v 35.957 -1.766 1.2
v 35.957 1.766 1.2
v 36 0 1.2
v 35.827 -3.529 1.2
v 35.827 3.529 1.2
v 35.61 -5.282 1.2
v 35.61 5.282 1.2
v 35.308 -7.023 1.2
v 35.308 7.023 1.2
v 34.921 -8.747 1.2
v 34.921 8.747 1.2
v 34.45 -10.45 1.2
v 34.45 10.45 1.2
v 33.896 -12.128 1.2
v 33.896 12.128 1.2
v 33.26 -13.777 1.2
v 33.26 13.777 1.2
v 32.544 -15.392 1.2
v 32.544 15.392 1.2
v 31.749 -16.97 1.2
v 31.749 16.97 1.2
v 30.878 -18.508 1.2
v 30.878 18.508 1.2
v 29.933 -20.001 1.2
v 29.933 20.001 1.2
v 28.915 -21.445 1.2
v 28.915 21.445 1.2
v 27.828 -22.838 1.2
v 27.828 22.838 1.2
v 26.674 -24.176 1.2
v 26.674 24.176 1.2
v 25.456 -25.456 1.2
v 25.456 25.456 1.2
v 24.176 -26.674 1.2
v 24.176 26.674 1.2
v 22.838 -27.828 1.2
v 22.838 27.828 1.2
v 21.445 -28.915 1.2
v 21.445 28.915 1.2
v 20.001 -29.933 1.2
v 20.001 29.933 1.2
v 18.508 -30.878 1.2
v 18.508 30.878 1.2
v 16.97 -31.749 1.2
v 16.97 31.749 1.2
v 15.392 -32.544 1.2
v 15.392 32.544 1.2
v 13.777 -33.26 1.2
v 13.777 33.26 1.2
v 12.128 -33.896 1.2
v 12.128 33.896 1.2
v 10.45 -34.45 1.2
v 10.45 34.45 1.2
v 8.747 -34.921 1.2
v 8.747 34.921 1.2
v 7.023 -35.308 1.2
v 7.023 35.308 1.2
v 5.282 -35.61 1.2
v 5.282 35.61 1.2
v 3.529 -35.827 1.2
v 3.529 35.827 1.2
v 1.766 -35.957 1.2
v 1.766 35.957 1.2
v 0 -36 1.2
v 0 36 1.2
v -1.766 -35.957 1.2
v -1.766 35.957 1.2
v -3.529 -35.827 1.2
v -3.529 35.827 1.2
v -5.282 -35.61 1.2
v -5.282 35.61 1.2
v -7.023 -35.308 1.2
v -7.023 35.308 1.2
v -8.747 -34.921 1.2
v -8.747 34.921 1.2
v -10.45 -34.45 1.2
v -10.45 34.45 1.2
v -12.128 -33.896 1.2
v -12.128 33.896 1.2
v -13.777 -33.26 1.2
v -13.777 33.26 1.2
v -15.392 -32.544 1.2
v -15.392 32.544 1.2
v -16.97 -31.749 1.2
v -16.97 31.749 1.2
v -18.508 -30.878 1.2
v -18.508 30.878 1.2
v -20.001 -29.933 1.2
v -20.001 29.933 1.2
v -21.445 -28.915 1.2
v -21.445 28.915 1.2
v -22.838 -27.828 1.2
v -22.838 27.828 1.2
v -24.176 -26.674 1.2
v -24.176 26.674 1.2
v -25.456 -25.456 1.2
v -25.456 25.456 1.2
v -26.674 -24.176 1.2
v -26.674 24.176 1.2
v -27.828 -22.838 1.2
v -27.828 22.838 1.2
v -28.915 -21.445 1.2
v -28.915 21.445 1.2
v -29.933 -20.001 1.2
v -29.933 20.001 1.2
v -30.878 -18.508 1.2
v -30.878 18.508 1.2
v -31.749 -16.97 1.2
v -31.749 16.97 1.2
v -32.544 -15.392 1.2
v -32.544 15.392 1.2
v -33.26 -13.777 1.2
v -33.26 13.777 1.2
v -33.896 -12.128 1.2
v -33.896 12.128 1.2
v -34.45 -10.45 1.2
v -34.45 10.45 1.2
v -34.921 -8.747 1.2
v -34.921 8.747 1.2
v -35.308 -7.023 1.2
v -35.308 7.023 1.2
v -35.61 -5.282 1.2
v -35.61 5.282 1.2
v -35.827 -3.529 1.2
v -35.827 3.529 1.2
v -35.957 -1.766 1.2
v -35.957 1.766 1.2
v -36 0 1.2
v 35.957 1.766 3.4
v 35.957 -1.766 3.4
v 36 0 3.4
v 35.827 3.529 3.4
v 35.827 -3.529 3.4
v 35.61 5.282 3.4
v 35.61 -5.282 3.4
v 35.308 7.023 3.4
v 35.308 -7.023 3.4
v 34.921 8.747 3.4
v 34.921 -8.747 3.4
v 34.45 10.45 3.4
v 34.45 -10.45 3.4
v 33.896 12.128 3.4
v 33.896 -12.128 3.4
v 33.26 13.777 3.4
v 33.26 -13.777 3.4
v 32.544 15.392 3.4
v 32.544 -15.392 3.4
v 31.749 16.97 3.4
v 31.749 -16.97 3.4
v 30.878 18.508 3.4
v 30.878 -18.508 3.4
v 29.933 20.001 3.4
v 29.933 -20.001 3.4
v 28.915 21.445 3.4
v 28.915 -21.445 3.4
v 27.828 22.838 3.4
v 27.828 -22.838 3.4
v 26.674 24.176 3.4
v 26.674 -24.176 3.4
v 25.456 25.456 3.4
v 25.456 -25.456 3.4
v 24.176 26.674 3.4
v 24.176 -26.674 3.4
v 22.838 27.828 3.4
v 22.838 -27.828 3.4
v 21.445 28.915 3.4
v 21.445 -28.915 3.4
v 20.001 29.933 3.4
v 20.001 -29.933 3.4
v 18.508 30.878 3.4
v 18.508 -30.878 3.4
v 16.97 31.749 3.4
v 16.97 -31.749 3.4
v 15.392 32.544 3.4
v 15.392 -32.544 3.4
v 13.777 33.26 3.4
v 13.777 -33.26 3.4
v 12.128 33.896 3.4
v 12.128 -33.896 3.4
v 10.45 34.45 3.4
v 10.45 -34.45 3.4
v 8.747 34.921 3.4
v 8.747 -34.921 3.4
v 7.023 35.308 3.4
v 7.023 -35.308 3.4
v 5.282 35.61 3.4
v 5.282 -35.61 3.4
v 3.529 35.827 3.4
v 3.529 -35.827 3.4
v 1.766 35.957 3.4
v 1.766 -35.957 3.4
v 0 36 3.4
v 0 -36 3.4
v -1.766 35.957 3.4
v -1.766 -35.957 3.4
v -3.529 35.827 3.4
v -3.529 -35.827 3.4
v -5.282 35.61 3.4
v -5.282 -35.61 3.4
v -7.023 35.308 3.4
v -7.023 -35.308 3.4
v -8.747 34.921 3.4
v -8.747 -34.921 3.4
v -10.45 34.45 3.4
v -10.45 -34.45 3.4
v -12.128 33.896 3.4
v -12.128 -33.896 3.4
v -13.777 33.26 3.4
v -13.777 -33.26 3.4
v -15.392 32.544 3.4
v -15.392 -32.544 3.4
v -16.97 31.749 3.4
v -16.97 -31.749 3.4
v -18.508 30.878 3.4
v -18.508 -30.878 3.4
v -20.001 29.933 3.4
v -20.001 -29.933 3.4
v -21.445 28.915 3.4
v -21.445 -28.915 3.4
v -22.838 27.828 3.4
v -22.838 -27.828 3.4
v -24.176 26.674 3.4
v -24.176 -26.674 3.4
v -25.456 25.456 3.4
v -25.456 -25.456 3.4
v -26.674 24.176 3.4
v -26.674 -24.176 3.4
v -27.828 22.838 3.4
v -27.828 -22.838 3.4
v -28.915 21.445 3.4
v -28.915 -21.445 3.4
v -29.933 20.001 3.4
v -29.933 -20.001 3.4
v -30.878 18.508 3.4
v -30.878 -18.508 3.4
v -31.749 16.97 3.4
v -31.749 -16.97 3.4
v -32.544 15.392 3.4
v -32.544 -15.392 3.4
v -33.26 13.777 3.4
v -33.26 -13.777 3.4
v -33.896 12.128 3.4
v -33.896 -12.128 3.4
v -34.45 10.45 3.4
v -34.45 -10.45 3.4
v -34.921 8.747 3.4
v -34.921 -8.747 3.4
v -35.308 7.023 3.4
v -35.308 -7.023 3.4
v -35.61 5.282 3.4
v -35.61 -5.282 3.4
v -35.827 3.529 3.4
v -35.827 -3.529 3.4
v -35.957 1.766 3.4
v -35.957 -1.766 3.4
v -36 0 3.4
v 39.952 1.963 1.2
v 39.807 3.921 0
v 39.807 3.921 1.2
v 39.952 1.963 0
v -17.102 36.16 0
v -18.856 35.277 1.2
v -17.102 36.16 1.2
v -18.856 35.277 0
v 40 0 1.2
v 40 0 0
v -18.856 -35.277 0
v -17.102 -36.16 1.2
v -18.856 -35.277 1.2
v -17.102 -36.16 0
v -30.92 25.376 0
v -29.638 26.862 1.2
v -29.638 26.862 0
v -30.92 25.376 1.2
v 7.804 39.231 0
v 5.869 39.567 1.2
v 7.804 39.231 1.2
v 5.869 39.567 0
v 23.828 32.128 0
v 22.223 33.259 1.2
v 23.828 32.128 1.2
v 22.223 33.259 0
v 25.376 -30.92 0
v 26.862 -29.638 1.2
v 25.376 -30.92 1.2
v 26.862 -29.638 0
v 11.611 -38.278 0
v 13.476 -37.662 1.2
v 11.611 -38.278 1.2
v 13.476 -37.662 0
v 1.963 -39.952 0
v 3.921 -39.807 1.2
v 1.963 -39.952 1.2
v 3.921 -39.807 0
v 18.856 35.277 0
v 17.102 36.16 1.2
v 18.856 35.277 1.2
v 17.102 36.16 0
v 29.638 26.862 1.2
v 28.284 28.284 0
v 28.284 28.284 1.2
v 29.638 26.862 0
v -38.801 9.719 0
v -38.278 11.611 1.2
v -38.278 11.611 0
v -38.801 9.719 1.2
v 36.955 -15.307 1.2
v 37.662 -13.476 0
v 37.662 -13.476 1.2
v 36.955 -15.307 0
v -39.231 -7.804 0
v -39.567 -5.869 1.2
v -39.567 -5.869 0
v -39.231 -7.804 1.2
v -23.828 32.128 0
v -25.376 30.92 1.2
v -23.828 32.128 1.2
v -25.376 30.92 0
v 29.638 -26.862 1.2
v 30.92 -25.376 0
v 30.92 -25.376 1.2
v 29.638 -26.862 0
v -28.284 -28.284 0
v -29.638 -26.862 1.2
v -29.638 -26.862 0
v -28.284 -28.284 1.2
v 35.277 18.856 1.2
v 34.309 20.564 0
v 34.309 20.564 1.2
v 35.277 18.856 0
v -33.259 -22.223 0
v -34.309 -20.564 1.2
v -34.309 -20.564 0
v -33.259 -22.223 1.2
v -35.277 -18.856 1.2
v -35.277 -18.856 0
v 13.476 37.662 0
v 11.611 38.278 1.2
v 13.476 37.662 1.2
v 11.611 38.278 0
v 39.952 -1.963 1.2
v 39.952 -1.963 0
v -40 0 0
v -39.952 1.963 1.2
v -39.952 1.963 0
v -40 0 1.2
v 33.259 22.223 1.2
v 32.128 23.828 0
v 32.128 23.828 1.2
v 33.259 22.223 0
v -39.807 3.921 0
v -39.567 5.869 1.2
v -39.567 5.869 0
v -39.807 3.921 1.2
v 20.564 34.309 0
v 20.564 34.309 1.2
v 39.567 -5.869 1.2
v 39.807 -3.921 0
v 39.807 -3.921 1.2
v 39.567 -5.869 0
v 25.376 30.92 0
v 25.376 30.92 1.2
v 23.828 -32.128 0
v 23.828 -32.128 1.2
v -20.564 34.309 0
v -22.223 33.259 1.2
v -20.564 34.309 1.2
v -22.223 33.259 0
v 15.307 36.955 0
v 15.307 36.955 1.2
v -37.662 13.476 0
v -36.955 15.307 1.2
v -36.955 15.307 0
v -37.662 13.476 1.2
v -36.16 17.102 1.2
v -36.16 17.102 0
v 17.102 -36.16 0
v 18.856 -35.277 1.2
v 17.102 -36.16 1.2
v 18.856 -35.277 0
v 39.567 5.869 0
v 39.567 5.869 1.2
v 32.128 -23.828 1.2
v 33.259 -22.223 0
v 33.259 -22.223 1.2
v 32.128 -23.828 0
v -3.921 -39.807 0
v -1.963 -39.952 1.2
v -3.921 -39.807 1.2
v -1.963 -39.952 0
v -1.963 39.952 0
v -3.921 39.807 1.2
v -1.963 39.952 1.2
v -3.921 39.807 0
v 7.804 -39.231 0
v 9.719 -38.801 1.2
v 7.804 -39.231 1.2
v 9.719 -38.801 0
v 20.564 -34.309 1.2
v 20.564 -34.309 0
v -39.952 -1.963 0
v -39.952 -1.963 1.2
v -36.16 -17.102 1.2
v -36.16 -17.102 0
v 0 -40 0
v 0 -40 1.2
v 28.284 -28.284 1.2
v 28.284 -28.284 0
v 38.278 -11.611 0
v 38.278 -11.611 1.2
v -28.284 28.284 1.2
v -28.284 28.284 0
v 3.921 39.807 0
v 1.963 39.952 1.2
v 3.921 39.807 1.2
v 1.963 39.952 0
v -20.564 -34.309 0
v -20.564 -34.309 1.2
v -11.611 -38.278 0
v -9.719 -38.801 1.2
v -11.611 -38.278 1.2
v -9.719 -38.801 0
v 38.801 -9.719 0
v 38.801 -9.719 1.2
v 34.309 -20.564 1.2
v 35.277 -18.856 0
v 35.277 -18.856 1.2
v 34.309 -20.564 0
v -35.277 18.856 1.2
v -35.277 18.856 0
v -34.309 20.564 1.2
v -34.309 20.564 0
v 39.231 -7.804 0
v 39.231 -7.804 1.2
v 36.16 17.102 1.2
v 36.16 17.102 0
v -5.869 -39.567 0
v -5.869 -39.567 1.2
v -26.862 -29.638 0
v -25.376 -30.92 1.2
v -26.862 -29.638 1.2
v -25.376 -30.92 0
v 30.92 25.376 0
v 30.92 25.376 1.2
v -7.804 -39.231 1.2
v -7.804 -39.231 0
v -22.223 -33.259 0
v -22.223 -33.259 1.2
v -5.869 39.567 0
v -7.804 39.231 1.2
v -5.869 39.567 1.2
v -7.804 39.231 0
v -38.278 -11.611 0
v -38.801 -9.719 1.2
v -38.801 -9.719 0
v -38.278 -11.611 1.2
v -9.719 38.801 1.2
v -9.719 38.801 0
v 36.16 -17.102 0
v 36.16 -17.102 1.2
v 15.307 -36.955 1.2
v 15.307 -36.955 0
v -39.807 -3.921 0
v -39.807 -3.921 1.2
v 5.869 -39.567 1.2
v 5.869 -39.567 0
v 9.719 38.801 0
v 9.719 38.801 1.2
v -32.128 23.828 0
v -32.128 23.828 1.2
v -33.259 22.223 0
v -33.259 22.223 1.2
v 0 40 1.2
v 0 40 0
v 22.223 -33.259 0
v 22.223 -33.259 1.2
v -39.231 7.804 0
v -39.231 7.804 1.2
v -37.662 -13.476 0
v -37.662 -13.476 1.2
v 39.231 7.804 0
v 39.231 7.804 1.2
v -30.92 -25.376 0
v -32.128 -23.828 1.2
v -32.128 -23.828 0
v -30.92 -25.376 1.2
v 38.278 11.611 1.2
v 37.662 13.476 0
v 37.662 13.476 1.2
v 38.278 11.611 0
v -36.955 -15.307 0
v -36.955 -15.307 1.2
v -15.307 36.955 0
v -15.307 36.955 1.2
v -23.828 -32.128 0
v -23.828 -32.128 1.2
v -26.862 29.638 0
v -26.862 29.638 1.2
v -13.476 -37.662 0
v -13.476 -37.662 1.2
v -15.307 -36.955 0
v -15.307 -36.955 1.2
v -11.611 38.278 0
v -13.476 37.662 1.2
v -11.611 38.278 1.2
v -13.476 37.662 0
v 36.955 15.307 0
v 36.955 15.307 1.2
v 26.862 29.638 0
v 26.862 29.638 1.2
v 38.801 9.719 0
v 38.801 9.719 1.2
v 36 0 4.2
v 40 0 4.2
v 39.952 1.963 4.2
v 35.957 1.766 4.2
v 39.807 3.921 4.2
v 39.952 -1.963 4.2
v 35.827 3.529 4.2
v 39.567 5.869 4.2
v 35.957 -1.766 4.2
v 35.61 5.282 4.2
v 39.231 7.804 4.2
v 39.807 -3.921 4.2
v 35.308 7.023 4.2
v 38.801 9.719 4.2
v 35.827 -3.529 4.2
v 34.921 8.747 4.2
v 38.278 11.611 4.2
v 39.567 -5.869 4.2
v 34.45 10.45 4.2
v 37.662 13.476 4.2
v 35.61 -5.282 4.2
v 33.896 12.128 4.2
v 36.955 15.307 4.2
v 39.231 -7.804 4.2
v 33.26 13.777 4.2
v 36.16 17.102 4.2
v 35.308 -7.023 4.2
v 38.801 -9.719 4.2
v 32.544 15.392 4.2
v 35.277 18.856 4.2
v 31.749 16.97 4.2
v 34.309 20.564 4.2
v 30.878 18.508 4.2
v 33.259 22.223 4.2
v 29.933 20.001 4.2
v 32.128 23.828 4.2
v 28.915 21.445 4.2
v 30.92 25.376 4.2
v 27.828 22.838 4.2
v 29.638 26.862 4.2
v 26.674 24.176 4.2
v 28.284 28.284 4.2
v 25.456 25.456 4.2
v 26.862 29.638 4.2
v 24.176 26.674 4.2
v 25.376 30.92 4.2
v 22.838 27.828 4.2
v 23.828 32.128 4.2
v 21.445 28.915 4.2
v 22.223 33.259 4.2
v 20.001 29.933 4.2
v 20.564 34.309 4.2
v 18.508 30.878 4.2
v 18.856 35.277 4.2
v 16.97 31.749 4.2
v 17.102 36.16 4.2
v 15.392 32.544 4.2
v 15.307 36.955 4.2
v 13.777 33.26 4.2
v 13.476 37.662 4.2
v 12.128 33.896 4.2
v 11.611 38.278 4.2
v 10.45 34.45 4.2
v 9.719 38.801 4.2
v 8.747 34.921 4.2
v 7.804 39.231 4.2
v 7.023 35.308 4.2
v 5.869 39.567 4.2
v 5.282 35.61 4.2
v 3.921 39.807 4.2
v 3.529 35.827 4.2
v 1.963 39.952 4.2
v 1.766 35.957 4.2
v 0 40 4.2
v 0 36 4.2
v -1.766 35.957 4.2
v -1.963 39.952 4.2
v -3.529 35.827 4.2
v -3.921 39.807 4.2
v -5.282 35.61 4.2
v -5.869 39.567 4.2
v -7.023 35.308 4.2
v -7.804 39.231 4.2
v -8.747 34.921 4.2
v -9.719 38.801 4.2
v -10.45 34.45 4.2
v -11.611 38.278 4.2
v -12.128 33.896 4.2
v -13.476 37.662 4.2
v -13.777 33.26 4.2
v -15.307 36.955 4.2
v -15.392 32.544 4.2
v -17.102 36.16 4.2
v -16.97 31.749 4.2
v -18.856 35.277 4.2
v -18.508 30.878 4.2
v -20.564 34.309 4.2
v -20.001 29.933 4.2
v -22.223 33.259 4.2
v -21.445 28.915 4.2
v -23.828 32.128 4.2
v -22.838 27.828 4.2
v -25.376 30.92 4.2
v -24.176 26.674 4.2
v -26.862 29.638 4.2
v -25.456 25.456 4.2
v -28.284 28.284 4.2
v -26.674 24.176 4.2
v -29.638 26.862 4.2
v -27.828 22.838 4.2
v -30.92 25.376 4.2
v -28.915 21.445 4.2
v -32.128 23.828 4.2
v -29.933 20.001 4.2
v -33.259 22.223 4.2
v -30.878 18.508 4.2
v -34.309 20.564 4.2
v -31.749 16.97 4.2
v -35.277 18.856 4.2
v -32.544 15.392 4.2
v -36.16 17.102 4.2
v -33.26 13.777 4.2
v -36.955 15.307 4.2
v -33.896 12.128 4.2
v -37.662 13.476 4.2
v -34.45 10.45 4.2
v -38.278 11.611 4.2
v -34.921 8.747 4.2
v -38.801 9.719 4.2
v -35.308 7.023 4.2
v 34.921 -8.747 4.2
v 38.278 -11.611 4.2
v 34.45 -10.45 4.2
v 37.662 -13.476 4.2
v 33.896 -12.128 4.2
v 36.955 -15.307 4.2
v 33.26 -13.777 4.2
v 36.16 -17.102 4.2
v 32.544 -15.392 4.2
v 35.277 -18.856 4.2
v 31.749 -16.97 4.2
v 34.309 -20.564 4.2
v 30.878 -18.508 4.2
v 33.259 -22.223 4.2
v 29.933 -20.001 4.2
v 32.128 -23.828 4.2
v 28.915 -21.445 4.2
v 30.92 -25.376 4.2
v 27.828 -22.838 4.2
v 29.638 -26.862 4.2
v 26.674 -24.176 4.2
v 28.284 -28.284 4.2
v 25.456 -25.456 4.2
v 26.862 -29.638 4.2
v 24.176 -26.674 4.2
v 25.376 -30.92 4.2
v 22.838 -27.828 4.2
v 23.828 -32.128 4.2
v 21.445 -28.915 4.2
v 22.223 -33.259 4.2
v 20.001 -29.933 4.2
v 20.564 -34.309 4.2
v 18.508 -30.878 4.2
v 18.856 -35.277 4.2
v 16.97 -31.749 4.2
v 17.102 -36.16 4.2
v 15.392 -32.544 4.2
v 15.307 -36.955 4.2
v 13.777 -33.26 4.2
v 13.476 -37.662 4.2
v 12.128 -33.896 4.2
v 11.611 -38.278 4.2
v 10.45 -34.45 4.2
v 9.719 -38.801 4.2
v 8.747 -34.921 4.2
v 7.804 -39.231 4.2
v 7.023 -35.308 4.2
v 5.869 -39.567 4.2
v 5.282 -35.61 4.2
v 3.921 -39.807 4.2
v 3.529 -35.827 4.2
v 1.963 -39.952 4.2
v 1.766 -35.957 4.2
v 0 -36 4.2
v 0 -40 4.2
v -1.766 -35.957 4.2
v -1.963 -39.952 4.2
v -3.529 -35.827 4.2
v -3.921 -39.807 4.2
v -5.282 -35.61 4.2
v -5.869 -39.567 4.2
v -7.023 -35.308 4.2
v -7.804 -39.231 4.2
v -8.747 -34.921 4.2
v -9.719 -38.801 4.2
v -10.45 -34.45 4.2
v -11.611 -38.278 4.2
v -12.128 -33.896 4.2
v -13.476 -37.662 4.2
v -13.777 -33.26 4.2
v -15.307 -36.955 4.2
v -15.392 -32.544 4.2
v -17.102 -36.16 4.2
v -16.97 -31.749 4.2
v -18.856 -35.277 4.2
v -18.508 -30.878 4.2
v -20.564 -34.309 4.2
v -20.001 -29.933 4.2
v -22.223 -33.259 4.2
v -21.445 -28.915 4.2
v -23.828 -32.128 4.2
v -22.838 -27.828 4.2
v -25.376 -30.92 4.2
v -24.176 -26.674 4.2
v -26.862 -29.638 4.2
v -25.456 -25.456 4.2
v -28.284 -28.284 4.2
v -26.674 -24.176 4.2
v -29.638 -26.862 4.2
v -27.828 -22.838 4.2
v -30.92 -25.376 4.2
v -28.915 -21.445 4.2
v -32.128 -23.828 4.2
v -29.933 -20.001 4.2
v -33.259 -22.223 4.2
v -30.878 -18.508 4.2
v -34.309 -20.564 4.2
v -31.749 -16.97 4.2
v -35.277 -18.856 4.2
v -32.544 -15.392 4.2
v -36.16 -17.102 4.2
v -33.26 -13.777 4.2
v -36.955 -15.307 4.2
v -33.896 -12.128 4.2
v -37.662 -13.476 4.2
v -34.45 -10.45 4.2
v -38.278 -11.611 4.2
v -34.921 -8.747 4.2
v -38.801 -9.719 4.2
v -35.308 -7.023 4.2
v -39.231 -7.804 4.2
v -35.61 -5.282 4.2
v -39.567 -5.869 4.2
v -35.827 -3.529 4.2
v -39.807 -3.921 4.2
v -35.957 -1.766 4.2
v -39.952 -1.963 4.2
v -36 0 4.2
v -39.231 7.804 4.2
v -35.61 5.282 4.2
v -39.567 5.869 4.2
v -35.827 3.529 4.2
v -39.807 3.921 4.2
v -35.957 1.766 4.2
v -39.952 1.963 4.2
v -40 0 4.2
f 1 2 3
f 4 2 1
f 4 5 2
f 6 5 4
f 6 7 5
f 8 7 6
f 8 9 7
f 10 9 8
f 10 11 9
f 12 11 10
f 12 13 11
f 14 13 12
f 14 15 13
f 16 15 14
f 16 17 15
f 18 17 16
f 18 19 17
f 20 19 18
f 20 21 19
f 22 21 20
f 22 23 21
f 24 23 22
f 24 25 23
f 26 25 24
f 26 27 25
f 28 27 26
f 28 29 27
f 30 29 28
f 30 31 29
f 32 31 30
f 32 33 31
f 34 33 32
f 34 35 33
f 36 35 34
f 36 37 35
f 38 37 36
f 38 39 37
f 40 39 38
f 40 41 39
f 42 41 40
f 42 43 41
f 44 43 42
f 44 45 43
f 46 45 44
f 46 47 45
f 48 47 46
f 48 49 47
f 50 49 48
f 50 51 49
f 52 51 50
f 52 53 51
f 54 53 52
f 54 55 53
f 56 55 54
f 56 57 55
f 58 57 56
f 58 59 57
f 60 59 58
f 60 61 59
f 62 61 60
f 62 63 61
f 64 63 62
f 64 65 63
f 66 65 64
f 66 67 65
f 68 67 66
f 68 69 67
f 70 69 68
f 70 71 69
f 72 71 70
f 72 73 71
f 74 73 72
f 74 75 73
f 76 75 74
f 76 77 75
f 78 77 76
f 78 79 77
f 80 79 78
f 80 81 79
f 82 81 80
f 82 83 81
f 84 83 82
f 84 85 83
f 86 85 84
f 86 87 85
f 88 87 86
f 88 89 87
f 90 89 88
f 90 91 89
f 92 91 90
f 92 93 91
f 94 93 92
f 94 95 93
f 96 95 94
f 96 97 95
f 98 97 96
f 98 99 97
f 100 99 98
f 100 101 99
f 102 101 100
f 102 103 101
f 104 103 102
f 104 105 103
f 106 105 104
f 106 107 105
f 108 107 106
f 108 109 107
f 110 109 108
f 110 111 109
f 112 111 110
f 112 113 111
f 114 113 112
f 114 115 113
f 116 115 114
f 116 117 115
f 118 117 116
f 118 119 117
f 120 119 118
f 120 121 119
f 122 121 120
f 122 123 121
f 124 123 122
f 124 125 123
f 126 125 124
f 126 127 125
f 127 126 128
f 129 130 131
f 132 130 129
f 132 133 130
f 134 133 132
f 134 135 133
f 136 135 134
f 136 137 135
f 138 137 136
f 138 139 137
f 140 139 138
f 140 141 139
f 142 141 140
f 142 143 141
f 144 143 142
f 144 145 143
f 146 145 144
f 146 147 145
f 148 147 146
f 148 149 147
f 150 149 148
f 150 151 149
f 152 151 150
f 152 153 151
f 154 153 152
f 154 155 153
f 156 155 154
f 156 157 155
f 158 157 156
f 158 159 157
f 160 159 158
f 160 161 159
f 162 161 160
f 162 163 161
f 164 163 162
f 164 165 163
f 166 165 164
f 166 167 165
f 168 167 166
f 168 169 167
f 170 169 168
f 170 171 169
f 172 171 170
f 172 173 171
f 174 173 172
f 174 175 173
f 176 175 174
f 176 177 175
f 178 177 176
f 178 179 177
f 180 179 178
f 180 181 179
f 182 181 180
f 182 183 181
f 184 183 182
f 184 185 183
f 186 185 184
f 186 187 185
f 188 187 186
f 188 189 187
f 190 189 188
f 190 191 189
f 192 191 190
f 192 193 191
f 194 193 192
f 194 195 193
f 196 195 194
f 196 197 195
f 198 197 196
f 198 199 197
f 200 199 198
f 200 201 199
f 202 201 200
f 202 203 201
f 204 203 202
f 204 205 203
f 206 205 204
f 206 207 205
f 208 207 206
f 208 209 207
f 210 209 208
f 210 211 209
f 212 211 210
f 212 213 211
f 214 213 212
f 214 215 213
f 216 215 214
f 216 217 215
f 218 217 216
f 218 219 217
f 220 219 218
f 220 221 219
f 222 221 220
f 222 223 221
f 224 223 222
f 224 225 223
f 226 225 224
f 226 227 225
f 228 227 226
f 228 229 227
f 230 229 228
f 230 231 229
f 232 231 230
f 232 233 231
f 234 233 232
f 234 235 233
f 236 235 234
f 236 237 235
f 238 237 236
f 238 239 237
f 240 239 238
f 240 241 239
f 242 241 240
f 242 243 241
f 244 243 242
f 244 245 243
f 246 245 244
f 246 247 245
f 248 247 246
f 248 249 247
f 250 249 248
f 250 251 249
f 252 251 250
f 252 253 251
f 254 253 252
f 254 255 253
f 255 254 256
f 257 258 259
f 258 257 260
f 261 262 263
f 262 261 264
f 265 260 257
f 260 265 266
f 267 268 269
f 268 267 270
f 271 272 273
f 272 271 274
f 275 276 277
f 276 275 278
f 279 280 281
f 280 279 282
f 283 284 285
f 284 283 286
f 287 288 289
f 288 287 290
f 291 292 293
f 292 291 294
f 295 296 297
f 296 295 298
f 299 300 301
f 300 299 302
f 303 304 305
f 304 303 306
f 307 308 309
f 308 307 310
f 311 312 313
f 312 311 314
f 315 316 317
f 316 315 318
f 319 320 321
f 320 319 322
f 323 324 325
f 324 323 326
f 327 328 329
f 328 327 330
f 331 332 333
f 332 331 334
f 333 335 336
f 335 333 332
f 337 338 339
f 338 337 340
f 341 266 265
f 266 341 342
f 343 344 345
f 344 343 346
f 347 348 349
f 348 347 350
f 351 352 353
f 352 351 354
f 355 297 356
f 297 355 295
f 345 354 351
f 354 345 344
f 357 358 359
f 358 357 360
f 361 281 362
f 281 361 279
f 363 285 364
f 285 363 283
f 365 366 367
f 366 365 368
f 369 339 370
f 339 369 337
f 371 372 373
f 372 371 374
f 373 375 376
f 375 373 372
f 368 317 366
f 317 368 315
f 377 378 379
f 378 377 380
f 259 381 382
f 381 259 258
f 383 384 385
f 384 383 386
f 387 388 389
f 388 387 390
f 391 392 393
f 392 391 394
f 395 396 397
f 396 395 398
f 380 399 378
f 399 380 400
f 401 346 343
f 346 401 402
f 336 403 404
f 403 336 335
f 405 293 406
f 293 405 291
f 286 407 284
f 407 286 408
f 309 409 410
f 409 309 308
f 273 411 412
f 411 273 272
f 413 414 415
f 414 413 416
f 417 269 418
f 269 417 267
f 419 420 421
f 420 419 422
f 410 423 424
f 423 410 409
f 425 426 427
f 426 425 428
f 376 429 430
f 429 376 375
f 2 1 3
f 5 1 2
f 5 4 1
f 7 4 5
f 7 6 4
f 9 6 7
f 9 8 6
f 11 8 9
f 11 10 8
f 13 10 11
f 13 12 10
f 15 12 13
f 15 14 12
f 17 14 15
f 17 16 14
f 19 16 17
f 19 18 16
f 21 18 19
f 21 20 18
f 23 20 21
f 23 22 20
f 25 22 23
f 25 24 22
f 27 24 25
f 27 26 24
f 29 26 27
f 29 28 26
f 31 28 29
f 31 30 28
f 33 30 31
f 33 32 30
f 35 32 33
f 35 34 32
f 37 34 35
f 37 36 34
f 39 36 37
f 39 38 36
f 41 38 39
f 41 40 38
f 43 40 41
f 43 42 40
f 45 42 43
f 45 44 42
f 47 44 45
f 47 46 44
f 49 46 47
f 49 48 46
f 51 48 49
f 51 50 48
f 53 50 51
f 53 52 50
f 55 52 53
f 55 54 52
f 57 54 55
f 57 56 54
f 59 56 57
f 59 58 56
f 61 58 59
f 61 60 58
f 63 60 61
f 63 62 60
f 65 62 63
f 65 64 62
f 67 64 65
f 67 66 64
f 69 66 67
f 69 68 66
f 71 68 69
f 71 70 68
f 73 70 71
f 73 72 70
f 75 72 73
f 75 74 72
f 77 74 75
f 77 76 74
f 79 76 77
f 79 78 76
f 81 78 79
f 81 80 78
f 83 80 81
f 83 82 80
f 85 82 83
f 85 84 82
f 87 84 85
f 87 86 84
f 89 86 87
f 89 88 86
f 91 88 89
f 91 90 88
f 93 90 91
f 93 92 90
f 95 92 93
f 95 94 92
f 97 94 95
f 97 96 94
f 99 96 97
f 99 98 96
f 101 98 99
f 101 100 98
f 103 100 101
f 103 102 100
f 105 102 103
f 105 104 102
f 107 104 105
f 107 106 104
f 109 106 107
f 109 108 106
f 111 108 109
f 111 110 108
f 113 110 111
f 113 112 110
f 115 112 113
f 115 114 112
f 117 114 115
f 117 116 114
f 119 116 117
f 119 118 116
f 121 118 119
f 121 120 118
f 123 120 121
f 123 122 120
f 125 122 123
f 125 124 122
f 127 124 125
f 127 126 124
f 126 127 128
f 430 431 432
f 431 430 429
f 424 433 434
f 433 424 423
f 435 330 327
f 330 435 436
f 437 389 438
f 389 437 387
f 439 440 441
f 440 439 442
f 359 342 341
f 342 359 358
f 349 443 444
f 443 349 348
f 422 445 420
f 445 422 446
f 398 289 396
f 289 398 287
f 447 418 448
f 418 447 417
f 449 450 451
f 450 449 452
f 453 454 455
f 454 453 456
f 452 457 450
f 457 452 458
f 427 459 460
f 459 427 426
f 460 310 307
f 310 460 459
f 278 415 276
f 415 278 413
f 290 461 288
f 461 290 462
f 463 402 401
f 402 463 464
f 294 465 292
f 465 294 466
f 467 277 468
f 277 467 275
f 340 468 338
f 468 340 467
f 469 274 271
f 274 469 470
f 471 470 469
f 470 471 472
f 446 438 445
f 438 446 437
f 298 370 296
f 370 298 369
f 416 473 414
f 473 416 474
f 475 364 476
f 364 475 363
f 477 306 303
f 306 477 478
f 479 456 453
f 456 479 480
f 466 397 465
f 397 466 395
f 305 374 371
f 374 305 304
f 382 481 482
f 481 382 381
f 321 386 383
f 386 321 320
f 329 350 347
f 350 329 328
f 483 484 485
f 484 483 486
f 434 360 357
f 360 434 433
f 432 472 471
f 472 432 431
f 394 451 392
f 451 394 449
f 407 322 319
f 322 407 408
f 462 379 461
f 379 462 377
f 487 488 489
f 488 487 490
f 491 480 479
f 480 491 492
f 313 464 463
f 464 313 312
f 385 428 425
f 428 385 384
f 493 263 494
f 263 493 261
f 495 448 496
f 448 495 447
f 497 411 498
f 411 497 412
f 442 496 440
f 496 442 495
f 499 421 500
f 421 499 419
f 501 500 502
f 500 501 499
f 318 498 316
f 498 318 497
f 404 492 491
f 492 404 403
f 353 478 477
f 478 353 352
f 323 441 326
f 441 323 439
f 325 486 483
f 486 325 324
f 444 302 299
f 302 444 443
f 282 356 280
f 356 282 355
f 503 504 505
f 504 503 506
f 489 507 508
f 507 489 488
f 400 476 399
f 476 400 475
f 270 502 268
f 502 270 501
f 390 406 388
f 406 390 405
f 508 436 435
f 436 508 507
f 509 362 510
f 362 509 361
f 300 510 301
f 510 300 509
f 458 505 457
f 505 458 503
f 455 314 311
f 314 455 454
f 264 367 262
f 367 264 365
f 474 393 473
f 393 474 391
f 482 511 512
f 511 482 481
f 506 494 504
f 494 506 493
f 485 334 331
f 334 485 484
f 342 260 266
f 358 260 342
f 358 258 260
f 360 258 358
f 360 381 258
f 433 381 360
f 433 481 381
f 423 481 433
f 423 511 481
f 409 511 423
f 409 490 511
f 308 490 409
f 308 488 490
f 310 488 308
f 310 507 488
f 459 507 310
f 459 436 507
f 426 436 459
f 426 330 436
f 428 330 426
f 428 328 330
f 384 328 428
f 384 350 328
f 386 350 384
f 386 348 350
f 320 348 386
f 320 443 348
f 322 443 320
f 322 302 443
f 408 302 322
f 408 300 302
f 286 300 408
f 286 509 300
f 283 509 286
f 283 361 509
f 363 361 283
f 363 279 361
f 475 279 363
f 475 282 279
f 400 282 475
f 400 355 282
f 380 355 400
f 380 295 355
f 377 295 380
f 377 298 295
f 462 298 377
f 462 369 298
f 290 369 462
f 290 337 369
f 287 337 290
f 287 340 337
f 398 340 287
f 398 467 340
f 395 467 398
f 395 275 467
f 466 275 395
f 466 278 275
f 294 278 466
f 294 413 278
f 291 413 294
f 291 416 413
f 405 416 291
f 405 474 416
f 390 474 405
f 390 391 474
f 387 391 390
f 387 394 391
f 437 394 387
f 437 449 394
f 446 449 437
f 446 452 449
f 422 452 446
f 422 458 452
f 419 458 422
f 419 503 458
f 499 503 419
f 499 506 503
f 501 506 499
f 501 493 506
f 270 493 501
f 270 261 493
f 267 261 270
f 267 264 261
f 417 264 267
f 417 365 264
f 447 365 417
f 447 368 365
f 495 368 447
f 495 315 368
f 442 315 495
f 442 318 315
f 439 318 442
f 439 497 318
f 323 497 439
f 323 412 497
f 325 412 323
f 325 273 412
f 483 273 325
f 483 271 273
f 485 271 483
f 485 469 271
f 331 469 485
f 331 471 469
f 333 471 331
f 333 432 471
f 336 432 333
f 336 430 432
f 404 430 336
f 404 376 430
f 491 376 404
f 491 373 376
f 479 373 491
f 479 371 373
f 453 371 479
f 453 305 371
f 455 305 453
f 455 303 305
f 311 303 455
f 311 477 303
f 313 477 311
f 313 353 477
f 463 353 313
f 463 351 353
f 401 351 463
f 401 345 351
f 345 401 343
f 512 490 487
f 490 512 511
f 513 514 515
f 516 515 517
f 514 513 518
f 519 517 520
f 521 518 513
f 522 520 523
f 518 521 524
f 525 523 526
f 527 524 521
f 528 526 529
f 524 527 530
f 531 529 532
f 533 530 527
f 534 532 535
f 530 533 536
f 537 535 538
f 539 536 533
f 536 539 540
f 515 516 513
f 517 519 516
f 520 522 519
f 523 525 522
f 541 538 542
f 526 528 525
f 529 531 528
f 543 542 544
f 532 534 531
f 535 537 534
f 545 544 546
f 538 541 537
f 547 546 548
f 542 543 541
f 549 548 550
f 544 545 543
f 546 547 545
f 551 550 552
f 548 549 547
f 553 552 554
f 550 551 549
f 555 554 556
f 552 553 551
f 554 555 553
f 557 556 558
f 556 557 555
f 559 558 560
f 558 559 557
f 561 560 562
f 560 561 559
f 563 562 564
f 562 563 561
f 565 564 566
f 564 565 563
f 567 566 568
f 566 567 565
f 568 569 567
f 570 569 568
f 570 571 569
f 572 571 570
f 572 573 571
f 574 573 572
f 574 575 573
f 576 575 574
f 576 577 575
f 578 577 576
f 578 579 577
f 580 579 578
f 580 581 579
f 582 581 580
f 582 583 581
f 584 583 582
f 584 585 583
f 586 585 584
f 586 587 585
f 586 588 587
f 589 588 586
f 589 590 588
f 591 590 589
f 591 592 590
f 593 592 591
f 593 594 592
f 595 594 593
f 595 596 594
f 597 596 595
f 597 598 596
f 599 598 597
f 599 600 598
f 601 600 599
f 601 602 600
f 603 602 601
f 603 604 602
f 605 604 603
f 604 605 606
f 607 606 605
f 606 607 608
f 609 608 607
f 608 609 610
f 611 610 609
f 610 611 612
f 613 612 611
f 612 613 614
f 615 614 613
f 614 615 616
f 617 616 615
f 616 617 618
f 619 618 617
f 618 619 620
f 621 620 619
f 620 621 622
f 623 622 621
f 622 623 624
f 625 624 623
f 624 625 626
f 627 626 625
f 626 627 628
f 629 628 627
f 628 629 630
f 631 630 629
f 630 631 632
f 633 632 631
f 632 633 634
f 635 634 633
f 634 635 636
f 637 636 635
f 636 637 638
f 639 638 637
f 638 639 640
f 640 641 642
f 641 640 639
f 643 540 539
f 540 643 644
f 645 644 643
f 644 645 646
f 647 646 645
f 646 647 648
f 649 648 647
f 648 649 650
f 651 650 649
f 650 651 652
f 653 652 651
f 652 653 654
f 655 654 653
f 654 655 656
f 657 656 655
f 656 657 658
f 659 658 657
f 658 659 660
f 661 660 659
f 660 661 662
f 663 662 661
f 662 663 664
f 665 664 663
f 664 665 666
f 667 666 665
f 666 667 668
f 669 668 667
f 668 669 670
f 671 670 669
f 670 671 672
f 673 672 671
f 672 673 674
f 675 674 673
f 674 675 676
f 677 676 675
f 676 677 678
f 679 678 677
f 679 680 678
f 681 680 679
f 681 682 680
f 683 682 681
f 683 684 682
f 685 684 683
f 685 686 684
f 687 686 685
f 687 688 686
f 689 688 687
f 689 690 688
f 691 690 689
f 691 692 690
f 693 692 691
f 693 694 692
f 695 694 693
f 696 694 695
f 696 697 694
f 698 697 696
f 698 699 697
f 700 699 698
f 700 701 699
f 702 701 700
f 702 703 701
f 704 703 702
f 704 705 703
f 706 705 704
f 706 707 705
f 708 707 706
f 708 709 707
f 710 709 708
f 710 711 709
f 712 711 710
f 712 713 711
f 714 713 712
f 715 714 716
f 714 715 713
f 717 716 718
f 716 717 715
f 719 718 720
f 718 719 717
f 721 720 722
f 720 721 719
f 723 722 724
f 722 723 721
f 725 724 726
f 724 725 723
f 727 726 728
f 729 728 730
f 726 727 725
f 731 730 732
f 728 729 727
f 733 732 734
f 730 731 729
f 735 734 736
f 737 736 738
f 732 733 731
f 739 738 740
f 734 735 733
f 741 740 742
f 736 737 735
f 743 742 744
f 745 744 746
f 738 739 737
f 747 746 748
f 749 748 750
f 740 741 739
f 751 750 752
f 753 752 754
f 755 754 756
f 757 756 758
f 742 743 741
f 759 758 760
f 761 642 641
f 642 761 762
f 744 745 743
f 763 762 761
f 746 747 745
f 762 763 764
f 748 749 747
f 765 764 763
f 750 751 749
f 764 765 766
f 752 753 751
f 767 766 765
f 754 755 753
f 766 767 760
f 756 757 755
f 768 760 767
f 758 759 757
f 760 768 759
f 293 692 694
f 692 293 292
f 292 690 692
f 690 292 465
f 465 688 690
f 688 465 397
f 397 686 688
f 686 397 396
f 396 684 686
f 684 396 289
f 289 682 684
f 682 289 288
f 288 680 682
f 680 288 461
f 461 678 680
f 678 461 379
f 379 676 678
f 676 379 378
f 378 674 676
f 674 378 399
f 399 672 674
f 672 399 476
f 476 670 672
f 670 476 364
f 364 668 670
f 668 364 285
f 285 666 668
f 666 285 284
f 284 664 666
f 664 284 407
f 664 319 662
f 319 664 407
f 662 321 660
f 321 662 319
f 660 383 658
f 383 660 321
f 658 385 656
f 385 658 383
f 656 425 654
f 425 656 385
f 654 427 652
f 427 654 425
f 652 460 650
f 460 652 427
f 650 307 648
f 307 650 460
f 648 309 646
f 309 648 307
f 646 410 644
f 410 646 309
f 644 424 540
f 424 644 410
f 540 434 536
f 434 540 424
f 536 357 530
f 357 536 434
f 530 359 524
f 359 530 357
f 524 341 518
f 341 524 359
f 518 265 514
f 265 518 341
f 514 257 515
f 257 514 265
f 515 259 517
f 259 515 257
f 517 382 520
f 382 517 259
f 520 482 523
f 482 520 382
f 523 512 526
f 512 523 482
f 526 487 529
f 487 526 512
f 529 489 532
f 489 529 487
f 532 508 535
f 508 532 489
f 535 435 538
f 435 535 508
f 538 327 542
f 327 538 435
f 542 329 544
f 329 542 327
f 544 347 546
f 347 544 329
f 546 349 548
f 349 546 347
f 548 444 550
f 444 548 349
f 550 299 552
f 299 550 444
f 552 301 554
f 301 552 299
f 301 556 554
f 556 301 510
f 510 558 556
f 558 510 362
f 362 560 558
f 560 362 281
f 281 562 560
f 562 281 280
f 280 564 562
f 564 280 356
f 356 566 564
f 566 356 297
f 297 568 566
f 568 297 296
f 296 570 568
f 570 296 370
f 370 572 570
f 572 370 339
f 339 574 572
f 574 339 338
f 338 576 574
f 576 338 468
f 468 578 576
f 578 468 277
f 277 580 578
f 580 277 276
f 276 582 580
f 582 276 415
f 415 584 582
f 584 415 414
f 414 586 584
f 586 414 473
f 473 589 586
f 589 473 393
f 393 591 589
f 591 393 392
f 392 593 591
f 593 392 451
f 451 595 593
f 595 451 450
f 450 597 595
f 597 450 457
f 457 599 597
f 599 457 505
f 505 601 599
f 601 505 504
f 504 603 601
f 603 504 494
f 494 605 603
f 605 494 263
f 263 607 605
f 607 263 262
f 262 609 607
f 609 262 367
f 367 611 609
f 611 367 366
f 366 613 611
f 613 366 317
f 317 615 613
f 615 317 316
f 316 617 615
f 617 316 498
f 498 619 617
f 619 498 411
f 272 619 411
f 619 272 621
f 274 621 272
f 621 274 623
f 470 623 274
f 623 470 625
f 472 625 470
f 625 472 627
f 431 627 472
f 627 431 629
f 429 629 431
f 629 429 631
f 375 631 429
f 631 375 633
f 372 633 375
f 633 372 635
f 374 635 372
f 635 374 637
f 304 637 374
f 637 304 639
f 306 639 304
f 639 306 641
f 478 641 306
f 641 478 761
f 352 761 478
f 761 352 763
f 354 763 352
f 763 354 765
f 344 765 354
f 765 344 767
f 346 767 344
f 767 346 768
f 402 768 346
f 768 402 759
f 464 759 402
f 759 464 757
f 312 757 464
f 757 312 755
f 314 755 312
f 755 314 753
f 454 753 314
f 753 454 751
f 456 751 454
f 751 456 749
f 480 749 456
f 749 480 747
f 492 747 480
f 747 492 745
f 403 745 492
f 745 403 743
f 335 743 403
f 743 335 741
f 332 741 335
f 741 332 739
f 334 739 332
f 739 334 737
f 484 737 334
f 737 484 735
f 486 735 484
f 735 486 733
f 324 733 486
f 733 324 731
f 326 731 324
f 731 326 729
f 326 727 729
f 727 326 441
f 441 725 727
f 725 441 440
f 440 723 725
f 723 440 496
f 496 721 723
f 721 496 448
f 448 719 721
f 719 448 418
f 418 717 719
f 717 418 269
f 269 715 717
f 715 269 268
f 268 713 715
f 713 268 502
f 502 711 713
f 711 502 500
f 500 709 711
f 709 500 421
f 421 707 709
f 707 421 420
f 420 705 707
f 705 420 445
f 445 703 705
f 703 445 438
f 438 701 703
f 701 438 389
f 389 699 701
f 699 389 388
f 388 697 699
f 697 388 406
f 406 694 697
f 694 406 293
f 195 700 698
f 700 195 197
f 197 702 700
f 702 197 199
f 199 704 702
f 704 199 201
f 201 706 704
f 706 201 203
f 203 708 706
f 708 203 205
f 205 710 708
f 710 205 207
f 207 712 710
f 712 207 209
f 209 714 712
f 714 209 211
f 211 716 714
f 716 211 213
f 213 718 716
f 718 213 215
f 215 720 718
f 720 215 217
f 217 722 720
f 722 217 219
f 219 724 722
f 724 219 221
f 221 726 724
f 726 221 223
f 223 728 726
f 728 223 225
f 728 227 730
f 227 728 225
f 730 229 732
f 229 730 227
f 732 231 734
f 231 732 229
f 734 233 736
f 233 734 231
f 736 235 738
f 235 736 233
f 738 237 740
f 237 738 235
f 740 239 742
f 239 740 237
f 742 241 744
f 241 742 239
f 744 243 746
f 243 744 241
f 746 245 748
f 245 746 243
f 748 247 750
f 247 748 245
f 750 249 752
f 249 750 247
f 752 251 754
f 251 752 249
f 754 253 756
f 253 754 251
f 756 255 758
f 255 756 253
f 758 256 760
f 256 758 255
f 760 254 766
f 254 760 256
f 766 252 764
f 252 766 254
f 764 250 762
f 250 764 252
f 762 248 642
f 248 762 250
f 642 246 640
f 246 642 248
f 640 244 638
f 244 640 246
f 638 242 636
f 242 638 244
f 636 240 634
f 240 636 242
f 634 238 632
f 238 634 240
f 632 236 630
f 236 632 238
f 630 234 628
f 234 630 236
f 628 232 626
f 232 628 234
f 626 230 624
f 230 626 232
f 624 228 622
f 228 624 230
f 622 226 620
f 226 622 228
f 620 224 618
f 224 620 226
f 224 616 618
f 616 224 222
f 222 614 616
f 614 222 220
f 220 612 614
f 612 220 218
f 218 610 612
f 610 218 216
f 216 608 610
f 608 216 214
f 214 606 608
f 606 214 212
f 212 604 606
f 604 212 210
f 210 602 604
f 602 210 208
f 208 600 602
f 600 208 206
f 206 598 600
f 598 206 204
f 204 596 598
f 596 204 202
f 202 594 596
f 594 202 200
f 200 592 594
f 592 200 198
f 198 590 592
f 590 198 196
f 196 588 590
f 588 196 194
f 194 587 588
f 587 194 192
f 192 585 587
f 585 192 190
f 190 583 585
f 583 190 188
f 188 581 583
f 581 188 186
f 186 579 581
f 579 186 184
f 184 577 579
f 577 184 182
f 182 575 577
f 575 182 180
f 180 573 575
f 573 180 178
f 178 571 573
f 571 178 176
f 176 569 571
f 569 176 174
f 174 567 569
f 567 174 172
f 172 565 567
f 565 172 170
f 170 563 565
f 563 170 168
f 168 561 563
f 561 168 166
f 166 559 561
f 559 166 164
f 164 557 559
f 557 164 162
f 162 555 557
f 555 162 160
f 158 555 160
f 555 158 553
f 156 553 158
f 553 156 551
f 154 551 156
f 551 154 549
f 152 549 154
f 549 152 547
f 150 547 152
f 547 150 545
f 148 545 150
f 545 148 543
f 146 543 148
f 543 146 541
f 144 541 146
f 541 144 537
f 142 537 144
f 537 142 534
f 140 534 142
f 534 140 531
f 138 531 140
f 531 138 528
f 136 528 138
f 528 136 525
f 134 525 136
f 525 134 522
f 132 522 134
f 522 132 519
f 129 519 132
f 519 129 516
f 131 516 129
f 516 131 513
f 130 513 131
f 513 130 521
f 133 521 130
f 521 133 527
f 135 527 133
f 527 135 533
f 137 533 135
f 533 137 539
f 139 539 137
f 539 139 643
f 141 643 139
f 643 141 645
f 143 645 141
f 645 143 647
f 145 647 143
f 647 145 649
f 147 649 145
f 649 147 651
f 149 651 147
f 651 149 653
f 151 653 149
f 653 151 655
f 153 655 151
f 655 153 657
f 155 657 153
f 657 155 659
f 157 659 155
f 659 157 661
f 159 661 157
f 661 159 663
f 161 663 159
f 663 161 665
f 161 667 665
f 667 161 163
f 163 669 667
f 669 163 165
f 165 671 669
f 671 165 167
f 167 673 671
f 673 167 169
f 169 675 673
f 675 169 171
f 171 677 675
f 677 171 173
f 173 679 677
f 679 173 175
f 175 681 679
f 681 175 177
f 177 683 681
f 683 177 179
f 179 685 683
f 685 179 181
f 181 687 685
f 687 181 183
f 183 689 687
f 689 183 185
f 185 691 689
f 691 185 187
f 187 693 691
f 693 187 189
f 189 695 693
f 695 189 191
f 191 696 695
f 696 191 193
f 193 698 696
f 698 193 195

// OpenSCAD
// lithophane_circle/model.scad
// Circular lithophane photo frame — single solid piece.
// Print flat (Z=0 face on bed). Display against a backlight.

photo_path    = "";
photo_cols    = 200;
photo_rows    = 200;
diameter      = 80;
min_thickness = 0.8;
max_thickness = 3.0;
frame_width   = 4;
base_height   = 1.2;

inner_d = diameter - 2 * frame_width;

module litho_fill() {
  intersection() {
    union() {
      linear_extrude(height = min_thickness)
        circle(d = inner_d, $fn = 128);

      if (photo_path != "") {
        translate([0, 0, min_thickness])
          scale([inner_d / photo_cols,
                 inner_d / photo_rows,
                 (max_thickness - min_thickness) / 255.0])
            surface(file = photo_path, center = true, invert = false, convexity = 4);
      } else {
        linear_extrude(height = max_thickness - min_thickness)
          circle(d = inner_d, $fn = 128);
      }
    }
    linear_extrude(height = max_thickness + 1)
      circle(d = inner_d, $fn = 128);
  }
}

union() {
  // Base plate
  linear_extrude(height = base_height)
    circle(d = diameter, $fn = 128);

  // Frame ring
  translate([0, 0, base_height])
    linear_extrude(height = max_thickness)
      difference() {
        circle(d = diameter, $fn = 128);
        circle(d = inner_d,  $fn = 128);
      }

  // Lithophane fill
  translate([0, 0, base_height])
    litho_fill();
}
